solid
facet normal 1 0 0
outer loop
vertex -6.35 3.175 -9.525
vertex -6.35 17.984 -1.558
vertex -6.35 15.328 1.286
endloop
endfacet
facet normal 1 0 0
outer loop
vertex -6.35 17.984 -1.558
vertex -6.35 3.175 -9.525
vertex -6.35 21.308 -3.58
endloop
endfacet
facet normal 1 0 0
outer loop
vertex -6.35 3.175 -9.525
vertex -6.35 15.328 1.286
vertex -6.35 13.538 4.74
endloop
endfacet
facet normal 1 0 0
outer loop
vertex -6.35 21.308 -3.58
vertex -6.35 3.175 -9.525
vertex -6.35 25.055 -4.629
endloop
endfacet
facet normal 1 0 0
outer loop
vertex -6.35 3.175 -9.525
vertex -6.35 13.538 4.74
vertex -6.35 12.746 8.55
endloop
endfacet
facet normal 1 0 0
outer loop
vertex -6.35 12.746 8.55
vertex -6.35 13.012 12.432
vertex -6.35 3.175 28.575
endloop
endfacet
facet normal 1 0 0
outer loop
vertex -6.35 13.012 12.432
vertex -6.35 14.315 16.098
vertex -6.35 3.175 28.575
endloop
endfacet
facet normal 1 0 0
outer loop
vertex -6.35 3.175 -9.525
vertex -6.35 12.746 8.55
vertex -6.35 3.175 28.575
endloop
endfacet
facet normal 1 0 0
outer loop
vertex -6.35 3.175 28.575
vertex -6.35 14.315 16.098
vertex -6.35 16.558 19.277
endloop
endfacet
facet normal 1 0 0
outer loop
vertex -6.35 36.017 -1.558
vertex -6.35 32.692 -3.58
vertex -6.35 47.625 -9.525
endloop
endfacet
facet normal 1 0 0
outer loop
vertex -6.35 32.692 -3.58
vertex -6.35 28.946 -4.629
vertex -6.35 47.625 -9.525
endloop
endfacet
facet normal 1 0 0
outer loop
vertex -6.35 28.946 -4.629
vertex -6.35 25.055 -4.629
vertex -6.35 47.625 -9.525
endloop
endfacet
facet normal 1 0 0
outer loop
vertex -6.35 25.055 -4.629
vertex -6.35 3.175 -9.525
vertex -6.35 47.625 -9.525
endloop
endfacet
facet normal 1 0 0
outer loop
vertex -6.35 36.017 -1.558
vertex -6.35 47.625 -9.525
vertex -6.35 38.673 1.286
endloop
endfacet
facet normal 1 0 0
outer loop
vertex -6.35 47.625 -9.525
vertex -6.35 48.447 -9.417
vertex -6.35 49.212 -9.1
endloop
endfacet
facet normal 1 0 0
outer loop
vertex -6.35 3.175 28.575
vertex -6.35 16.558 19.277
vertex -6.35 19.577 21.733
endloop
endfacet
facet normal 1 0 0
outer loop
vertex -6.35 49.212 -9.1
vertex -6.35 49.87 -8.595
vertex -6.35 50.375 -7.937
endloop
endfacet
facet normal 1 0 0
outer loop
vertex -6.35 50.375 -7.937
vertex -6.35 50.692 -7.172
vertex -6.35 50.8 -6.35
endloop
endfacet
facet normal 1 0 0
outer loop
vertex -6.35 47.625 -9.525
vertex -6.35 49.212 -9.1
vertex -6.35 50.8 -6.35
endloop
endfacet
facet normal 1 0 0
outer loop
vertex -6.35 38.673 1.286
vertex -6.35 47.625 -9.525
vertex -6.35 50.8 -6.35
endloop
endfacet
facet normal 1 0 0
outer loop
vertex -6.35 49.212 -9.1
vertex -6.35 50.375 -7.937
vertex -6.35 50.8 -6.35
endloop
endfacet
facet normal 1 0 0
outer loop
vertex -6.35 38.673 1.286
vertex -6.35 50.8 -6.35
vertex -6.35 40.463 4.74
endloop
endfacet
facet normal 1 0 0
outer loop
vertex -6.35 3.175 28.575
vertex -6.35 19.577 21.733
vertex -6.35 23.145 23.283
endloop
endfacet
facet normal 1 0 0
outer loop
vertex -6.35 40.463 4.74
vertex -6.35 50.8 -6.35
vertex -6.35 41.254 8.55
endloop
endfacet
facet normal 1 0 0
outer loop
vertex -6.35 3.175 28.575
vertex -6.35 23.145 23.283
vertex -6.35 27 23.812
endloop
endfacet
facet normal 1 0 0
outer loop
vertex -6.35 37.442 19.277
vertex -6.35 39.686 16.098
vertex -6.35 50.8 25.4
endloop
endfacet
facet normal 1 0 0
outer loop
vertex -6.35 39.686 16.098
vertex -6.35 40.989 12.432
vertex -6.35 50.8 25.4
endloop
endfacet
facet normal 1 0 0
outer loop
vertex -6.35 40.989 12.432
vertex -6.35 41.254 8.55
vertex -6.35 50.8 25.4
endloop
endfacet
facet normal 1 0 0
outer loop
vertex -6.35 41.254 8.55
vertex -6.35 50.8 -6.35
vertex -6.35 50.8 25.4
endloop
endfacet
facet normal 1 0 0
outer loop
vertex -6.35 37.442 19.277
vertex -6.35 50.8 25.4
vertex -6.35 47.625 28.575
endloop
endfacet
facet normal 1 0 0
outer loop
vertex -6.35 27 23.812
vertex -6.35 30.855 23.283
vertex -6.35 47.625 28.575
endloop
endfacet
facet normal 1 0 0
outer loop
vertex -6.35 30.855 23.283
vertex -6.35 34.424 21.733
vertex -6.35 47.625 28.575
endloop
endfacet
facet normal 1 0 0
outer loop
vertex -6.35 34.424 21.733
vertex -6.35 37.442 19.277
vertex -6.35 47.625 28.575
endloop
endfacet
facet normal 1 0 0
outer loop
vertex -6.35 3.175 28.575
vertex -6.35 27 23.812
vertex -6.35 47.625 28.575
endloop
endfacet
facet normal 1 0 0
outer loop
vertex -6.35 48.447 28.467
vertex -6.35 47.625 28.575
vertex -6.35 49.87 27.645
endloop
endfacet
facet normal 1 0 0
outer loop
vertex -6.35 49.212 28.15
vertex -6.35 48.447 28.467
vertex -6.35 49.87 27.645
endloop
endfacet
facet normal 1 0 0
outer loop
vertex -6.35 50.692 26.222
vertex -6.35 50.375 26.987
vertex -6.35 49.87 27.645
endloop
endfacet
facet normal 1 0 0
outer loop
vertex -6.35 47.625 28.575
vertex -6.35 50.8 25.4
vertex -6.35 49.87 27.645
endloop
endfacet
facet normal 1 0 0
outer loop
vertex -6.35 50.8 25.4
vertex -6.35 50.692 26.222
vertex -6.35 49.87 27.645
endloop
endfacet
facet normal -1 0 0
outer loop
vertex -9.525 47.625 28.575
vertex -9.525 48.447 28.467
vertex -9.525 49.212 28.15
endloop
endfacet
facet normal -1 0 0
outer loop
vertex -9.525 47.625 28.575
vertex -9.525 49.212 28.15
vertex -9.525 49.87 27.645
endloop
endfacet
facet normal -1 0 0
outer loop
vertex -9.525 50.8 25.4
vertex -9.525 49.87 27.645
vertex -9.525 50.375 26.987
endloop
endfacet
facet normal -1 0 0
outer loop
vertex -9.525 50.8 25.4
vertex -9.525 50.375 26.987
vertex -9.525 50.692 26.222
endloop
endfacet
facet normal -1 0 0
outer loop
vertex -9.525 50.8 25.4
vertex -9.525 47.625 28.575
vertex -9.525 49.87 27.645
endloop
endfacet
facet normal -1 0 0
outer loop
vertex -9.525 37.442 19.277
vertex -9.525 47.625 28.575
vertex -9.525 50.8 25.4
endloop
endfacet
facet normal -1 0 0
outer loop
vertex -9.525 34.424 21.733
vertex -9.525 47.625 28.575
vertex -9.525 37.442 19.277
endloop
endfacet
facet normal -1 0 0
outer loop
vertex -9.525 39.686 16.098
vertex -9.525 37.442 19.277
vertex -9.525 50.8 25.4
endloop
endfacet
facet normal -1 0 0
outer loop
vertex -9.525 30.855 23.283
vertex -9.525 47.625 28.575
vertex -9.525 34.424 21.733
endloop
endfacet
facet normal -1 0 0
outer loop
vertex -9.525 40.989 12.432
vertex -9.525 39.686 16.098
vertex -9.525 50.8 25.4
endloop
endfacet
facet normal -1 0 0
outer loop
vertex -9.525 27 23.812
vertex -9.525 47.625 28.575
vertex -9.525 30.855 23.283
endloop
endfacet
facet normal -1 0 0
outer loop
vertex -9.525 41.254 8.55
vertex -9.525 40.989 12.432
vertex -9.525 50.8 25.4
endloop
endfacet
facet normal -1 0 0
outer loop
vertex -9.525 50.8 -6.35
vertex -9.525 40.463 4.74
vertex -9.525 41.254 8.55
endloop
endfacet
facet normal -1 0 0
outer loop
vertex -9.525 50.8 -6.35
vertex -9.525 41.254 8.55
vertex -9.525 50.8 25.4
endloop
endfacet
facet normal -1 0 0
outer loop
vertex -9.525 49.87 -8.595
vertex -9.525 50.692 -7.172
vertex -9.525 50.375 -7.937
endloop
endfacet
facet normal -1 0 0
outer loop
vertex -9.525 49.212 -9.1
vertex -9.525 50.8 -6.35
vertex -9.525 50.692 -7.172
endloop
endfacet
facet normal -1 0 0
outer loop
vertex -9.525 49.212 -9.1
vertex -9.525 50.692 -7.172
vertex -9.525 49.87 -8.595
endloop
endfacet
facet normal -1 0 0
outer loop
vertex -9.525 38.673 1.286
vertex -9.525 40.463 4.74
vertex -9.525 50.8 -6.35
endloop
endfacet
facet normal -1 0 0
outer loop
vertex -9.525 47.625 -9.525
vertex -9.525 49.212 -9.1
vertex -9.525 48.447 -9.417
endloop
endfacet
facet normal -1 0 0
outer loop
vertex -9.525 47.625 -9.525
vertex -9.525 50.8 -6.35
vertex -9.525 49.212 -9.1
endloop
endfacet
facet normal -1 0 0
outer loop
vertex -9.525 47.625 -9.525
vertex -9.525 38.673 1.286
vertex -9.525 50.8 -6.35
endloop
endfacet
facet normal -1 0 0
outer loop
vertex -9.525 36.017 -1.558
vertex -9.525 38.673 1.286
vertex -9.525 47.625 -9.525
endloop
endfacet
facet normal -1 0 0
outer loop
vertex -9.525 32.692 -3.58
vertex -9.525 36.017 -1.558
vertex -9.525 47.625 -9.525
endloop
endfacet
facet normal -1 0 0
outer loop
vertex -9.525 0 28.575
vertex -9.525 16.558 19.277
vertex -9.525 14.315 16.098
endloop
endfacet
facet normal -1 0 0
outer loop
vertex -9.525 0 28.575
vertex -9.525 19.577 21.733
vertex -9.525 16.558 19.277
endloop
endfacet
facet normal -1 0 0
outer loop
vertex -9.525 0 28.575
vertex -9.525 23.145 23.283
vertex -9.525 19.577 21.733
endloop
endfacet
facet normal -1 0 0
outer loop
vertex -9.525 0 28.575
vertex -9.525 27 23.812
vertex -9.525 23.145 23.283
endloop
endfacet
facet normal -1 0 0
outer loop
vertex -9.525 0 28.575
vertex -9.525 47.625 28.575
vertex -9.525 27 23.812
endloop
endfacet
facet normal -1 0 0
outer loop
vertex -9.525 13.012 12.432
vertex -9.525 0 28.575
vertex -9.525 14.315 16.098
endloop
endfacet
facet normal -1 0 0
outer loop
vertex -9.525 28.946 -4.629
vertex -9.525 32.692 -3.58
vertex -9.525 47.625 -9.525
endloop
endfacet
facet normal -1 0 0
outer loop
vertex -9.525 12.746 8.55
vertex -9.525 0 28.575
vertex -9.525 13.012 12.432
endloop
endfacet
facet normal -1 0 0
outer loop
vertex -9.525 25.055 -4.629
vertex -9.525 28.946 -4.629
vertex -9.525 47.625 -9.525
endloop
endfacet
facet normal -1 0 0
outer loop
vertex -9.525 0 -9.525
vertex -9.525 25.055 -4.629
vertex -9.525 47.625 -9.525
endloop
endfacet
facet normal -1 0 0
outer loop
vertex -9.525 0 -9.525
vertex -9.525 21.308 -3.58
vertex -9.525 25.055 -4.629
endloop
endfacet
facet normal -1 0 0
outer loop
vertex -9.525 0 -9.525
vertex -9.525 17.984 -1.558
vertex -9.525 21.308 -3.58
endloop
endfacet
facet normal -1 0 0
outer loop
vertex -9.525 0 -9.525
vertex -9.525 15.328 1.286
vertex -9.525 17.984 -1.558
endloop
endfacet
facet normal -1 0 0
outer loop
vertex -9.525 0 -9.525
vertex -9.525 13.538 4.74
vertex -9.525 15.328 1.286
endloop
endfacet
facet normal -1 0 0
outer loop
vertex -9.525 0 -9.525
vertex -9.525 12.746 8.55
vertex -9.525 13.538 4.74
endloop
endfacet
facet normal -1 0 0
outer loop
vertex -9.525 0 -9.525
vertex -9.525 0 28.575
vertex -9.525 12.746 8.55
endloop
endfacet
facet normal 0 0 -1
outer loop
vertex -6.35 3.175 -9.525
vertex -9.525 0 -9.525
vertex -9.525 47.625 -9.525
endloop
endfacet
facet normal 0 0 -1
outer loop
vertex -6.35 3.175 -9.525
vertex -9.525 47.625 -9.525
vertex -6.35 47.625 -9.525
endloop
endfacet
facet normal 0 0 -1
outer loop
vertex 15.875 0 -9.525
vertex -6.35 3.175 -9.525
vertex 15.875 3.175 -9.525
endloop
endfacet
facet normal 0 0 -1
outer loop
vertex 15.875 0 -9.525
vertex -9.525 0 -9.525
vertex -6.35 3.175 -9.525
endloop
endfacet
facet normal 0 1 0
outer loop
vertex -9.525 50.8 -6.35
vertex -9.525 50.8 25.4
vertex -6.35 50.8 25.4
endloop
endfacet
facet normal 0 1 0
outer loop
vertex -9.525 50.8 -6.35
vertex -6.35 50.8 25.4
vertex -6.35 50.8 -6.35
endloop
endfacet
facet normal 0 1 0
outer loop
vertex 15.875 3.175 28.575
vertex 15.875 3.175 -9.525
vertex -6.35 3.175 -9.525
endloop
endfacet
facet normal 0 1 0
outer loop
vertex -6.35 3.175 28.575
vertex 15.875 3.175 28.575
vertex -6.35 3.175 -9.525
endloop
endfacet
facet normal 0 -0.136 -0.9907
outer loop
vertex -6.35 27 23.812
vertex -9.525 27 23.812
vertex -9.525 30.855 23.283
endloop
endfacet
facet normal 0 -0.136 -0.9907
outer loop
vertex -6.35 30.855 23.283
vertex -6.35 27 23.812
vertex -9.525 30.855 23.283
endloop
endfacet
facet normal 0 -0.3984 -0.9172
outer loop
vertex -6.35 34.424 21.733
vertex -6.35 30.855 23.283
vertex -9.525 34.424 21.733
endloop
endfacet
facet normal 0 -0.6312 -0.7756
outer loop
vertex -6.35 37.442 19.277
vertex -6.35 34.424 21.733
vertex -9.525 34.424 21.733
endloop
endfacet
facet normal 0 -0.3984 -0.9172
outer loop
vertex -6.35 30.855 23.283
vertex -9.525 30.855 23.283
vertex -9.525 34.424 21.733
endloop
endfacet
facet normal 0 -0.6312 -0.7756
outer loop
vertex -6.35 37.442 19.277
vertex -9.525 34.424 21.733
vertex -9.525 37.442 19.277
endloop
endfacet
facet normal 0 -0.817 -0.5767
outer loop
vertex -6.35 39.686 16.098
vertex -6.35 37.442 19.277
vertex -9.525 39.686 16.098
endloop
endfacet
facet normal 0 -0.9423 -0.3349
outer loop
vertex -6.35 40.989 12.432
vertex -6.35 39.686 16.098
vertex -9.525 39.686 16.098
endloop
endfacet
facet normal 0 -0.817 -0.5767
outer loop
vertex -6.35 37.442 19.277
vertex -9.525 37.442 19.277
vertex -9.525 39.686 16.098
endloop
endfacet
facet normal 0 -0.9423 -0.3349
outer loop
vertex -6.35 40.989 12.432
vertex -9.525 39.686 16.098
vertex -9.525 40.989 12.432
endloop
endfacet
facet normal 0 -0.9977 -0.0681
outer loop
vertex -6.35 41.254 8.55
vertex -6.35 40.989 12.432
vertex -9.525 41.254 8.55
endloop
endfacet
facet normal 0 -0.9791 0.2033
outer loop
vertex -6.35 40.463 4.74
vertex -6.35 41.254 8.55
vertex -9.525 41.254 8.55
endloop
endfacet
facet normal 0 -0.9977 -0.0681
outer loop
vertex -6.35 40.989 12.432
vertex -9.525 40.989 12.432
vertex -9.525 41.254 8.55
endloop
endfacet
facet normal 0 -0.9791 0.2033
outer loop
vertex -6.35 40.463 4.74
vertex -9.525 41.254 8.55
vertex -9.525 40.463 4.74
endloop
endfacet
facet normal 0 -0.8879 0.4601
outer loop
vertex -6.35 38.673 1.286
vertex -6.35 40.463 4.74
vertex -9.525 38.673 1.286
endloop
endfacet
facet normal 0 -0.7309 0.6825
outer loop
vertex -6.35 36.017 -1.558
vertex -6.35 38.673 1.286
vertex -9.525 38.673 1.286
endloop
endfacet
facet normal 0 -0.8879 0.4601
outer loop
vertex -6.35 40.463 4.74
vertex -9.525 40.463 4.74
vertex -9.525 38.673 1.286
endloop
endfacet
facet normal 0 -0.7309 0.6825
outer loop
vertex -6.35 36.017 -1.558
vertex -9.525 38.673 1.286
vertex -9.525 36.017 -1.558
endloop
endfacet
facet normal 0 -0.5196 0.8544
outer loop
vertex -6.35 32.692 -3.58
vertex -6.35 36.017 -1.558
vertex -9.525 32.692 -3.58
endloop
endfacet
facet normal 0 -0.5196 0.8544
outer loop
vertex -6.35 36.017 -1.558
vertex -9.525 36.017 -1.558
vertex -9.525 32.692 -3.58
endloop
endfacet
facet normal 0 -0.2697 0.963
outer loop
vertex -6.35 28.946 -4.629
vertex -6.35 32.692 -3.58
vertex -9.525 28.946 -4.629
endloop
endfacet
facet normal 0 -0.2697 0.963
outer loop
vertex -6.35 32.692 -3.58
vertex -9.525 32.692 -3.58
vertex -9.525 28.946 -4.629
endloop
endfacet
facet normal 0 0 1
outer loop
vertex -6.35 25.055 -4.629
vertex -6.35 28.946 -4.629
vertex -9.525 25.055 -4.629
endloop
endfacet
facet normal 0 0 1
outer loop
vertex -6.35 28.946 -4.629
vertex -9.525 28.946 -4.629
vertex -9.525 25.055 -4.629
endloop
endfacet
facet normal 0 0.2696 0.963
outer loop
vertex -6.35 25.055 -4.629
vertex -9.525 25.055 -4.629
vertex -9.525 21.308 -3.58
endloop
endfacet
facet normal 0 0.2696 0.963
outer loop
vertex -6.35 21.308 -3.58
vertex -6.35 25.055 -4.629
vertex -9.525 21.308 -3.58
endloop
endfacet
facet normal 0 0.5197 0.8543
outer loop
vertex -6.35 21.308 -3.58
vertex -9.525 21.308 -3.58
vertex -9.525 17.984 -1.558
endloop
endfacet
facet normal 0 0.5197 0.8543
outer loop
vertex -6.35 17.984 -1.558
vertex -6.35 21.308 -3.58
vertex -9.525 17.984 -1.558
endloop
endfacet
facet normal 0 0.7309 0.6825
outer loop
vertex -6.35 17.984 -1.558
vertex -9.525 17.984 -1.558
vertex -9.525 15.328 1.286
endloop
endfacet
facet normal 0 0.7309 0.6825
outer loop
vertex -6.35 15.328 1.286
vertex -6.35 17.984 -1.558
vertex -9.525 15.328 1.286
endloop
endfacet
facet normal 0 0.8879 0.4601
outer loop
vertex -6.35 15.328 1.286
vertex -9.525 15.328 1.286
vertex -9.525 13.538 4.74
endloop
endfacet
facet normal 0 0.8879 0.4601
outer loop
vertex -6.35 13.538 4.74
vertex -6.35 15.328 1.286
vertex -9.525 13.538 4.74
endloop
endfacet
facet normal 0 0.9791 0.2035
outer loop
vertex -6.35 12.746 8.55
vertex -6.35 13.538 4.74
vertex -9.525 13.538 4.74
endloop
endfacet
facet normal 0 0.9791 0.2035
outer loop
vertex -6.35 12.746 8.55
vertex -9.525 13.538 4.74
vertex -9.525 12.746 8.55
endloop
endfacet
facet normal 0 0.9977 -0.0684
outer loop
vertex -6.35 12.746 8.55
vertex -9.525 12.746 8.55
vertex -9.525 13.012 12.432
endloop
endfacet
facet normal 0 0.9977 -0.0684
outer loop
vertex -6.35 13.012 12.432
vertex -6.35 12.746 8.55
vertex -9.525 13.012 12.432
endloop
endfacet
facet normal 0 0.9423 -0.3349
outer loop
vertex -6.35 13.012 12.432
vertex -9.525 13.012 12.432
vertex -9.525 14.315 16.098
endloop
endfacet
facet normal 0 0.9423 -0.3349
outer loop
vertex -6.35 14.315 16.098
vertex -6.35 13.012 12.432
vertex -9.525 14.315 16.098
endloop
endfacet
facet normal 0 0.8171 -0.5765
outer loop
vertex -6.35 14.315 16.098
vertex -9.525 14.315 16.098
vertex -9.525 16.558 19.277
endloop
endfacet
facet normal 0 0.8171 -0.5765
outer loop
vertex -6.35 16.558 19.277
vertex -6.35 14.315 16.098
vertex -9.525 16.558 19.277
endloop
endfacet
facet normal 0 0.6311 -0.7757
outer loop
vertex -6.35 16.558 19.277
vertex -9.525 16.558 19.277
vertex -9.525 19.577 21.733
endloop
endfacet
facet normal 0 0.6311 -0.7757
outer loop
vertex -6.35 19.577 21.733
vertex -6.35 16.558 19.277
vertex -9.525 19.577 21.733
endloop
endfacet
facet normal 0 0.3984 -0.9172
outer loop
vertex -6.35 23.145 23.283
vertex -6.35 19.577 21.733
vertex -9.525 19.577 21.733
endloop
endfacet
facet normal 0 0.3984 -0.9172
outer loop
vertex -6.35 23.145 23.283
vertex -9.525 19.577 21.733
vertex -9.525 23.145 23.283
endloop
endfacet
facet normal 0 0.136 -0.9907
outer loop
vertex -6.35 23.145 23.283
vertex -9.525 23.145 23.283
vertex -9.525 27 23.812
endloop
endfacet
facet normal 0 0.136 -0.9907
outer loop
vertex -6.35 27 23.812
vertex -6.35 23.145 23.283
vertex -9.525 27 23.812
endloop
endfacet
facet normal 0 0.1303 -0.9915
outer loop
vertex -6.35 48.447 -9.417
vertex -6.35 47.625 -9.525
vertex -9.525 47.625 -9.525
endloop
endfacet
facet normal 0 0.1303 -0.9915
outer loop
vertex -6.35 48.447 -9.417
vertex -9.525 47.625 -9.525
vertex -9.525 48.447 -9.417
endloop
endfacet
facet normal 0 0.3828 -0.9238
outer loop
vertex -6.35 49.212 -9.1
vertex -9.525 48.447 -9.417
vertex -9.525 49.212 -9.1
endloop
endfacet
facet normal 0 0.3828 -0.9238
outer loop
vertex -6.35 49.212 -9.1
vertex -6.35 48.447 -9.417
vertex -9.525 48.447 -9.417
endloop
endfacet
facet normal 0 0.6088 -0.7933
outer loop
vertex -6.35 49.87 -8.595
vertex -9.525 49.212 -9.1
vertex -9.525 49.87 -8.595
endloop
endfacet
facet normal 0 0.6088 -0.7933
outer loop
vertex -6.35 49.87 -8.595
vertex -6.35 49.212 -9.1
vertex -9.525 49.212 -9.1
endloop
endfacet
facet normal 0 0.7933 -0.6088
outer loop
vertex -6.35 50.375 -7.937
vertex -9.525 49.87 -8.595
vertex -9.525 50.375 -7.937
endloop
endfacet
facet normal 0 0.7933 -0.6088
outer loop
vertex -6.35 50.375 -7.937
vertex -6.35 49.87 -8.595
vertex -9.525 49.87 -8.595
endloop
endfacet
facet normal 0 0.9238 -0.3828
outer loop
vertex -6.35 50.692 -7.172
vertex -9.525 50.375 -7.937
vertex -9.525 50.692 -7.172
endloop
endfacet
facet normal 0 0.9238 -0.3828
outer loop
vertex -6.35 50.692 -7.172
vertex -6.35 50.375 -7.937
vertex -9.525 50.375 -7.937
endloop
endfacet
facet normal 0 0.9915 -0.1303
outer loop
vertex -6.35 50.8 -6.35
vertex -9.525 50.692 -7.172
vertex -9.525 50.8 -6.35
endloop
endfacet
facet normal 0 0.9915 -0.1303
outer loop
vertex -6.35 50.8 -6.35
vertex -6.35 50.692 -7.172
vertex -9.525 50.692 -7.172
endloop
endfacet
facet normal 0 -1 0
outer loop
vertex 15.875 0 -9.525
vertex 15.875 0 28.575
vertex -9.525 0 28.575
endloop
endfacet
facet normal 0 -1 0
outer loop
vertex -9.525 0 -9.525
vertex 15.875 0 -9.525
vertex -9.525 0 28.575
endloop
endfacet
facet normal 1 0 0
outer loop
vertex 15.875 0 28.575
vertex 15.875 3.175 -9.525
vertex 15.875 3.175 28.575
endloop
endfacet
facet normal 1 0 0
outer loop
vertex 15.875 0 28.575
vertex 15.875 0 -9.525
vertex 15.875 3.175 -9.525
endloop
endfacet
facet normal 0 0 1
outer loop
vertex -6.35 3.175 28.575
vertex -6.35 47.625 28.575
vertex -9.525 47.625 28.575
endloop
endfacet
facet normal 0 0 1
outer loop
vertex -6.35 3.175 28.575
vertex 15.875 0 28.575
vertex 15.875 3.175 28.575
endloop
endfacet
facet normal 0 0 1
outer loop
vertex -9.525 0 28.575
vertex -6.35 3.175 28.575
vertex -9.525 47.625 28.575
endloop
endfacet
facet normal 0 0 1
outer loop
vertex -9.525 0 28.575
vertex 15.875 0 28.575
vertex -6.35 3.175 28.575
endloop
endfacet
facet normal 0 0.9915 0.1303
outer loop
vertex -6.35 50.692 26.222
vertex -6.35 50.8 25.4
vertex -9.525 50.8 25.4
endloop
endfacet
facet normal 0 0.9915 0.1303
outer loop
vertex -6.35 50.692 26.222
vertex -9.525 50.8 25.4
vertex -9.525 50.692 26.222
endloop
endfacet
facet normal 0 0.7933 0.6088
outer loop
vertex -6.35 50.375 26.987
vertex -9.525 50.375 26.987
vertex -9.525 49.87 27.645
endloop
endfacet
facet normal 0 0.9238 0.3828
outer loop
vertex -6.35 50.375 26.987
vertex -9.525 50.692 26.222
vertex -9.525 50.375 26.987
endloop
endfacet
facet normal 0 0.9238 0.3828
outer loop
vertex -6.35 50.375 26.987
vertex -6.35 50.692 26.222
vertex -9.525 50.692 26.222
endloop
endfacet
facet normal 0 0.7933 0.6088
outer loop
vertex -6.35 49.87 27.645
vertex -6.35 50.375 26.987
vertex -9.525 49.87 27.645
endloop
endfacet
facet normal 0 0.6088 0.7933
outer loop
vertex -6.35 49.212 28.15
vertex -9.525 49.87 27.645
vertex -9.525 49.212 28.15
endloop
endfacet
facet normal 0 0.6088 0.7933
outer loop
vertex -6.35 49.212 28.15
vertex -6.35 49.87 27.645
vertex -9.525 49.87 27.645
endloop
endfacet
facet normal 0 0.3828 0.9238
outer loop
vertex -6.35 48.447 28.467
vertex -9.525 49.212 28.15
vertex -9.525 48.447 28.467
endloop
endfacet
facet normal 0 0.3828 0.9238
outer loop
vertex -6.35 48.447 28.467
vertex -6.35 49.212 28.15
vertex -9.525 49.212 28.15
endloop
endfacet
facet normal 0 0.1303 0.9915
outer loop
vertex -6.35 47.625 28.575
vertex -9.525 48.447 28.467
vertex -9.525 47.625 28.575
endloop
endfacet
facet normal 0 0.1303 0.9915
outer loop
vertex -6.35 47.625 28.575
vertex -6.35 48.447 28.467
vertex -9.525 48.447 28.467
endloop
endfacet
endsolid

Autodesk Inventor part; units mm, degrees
ref_plane "YZ Plane" through (0, 0, 0) normal (1, 0, 0) x (0, 1, 0)
ref_plane "XZ Plane" through (0, 0, 0) normal (0, 1, 0) x (-1, 0, 0)
ref_plane "XY Plane" through (0, 0, 0) normal (0, 0, 1) x (1, 0, 0)
sketch "Sketch1" plane through (0, 0, 0) normal (0, 1, 0) x (-1, 0, 0)
  line L0 (-15.875, 28.575) -> (9.525, 28.575)
  line L1 (9.525, 28.575) -> (9.525, -9.525)
  line L2 (9.525, -9.525) -> (-15.875, -9.525)
  line L3 (-15.875, -9.525) -> (-15.875, 28.575)
  point P0 (0, 0)
  dimension "d0" = 38.1
  dimension "d1" = 25.4
  dimension "d2" = 9.525
  dimension "d3" = 9.525
extrude "Extrusion1" add sketch "Sketch1" along normal blind 3.175
sketch "Sketch4" plane through (-9.525, 0, -9.525) normal (-1, 0, 0) x (0, 0, 1)
  circle A0 centre (19.05, 27.0002) radius 14.2875
  line L0 (38.1, 0) -> (38.1, 3.175) projected
  line L1 (38.1, 3.175) -> (0, 3.175) projected
  line L2 (0, 0) -> (38.1, 0) projected
  line L3 (0, 0) -> (38.1, 0)
  line L4 (38.1, 0) -> (38.1, 50.8)
  line L5 (38.1, 50.8) -> (0, 50.8)
  line L6 (0, 50.8) -> (0, 0)
  point P0 (9.525, 0)
  dimension "d11" = 19.05
  dimension "d12" = 28.575
  dimension "d14" = 50.8
  dimension "d18" = 27.0002
  dimension "d19" = 38.1
extrude "Extrusion2" add sketch "Sketch4" against normal blind 3.175
fillet "Fillet1" radius 3.175 2 edges at (-7.9375, 50.8, 28.575) (-7.9375, 50.8, -9.525)
properties part number "ARM_011_BearingMount"
